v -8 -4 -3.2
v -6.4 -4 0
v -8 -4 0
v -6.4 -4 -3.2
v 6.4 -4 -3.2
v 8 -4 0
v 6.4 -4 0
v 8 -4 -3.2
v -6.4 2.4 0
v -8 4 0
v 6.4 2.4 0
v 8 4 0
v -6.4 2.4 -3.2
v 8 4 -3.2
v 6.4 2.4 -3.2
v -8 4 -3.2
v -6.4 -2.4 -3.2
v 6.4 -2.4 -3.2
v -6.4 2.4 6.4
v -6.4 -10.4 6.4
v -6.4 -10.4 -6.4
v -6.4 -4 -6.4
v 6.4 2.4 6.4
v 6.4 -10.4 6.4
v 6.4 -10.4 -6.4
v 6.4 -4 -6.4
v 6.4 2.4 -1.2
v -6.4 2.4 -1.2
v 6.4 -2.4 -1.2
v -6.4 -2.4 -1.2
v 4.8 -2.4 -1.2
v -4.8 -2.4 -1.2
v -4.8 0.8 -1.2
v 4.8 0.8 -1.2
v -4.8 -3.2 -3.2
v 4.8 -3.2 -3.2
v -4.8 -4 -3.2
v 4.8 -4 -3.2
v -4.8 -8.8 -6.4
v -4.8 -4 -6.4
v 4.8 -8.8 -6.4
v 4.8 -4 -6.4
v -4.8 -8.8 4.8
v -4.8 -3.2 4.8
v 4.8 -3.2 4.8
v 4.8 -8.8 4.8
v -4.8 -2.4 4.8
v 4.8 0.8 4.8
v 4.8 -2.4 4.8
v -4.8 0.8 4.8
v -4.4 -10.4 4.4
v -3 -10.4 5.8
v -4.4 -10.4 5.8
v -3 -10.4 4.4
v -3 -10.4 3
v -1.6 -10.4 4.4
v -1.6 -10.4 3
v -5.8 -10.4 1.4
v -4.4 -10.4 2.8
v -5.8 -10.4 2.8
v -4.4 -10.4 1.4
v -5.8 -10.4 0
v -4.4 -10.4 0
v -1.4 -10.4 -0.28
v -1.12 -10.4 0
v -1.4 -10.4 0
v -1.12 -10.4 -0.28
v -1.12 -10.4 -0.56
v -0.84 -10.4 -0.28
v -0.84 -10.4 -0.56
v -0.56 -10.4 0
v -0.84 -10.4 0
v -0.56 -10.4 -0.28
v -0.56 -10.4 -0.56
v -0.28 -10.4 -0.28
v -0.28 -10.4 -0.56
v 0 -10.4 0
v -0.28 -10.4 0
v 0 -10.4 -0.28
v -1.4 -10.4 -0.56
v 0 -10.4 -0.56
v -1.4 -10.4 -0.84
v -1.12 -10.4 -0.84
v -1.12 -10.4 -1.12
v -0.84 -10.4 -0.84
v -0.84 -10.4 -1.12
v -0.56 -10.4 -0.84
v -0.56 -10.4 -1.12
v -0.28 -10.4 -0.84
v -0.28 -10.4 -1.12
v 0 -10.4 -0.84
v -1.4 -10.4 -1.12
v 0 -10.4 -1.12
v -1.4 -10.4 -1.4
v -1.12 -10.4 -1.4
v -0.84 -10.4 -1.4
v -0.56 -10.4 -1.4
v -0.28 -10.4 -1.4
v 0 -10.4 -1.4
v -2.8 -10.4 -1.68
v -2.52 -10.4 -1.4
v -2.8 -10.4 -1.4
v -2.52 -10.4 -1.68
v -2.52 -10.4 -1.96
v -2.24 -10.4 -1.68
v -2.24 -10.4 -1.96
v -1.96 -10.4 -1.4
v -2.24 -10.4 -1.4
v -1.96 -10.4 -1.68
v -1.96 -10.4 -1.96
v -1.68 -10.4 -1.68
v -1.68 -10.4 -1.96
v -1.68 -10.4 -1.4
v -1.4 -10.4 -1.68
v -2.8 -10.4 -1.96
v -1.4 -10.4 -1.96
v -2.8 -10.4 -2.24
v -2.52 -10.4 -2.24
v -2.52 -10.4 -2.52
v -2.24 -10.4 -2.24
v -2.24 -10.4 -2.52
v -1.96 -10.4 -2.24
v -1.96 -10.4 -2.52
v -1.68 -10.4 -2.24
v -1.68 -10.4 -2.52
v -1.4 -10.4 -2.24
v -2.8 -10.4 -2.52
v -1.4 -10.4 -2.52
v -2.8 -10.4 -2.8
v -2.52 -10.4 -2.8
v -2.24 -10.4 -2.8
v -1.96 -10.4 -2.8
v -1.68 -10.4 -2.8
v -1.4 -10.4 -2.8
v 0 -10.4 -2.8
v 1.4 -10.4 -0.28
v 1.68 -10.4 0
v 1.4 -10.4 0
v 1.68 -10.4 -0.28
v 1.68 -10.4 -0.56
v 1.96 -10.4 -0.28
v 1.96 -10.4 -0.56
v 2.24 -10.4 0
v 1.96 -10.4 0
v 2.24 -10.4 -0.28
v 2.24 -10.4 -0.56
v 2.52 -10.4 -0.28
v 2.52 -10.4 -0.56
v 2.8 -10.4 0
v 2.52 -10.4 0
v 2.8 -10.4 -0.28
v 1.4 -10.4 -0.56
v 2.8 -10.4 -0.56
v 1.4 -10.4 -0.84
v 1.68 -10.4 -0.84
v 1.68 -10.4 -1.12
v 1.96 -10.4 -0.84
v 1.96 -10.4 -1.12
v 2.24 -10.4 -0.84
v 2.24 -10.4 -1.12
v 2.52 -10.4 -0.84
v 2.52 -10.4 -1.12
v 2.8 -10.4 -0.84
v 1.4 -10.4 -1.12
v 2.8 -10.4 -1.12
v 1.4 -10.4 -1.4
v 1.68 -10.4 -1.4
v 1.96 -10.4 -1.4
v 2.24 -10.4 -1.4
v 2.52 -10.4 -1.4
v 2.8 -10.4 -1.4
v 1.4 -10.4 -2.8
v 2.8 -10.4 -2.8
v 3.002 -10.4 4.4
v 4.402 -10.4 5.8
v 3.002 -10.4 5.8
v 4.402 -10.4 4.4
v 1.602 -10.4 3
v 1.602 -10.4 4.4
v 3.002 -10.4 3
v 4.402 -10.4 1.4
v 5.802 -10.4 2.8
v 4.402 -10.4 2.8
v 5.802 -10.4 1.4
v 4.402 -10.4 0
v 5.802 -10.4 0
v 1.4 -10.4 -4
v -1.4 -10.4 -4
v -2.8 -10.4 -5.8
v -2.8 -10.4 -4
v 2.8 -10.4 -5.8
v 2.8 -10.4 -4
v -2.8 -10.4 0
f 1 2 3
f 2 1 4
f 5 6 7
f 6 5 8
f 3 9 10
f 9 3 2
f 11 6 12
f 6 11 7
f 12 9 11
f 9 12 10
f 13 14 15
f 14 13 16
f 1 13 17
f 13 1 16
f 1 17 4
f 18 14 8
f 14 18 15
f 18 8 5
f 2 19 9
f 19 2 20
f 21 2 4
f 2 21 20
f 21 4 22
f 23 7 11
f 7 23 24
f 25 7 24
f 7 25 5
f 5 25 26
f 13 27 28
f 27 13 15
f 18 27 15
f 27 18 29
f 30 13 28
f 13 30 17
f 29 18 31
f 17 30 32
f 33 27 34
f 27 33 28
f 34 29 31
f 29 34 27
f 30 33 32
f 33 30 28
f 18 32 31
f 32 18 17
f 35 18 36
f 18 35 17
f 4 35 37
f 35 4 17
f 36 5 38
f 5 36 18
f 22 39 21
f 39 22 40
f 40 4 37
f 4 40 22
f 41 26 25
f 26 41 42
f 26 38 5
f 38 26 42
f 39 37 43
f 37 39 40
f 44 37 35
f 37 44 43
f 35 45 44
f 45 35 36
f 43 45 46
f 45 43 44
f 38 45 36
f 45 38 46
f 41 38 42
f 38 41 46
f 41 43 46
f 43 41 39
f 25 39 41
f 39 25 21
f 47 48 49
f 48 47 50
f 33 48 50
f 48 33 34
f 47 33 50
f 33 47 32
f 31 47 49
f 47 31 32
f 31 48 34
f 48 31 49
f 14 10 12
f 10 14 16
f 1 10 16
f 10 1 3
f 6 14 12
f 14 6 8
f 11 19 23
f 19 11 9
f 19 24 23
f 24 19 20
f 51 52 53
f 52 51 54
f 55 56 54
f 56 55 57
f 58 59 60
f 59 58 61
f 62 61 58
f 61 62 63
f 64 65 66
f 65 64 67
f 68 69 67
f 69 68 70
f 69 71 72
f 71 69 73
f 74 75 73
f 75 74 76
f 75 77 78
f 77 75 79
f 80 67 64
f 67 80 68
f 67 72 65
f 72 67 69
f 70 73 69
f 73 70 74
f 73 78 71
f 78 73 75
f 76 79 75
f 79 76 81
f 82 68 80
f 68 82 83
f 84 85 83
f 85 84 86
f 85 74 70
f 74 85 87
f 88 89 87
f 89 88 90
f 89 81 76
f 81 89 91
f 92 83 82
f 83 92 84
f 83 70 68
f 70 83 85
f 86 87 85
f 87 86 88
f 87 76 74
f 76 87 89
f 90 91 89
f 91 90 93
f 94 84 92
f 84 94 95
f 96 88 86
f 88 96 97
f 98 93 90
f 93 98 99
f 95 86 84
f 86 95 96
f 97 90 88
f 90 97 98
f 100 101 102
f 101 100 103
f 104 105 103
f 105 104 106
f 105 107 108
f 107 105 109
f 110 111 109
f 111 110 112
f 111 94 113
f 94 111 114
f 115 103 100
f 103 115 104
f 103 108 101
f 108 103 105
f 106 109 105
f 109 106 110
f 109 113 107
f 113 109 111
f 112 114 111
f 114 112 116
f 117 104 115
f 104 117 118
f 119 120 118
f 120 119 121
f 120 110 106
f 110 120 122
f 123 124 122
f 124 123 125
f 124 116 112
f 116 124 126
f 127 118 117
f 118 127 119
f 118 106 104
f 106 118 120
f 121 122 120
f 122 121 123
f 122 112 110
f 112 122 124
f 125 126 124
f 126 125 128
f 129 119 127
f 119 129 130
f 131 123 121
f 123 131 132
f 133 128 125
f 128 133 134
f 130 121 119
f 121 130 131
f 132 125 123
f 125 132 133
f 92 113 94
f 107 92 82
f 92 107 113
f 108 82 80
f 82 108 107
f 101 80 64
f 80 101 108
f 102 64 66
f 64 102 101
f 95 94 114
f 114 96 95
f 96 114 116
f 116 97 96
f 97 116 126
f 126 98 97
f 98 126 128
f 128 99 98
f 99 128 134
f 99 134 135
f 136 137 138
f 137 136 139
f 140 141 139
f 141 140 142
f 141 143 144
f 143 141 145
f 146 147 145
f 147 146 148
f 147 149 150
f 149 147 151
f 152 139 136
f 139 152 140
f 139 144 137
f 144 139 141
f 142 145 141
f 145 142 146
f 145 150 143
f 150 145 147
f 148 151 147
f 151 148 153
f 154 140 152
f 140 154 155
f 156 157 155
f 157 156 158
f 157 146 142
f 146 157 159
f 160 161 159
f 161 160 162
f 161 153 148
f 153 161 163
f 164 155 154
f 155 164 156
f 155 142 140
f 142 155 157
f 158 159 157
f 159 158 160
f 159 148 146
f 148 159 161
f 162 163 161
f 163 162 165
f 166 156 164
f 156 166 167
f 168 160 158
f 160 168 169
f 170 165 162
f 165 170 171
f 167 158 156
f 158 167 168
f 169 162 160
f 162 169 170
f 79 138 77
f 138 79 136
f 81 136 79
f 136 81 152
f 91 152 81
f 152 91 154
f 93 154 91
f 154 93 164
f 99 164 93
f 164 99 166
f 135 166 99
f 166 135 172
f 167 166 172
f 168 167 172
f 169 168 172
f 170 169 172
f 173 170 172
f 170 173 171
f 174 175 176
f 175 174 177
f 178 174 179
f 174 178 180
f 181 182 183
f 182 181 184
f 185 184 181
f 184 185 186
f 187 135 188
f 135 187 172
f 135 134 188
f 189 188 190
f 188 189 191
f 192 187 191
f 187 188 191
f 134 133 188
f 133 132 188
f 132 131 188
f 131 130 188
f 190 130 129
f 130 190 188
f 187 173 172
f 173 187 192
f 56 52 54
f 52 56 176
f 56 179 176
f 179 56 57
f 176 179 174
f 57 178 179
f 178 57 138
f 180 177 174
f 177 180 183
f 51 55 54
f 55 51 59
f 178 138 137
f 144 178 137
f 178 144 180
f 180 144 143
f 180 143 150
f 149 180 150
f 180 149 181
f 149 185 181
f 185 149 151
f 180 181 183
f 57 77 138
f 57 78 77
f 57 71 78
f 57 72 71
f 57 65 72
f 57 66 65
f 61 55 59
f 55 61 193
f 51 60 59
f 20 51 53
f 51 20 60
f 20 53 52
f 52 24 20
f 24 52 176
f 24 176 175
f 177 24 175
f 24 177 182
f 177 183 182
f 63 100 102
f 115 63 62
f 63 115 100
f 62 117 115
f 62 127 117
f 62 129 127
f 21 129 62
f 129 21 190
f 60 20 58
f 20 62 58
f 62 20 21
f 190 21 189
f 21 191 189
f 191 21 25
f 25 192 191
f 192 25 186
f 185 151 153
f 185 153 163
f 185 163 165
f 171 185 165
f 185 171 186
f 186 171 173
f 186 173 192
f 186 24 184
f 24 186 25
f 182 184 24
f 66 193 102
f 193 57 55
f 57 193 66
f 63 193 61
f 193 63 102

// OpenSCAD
// file: ../p/rect3.scad
use <../lib.scad>
function ldraw_lib__rect3() = [
// 0 Rectangle with 3 Edges
// 0 Name: rect3.dat
// 0 Author: Mark Kennedy [mkennedy]
// 0 !LDRAW_ORG Primitive UPDATE 2010-01
// 0 !LICENSE Licensed under CC BY 2.0 and CC BY 4.0 : see CAreadme.txt
// 
// 0 BFC CERTIFY CCW
  [0,"BFC","CERTIFY"],
  [0,"BFC","CCW"],
// 
// 0 !HISTORY 2003-08-01 [PTadmin] Official Update 2003-02
// 0 !HISTORY 2007-06-24 [PTadmin] Header formatted for Contributor Agreement
// 0 !HISTORY 2008-07-01 [PTadmin] Official Update 2008-01
// 0 !HISTORY 2010-01-17 [mikeheide] Change winding to CCW
// 0 !HISTORY 2010-04-05 [PTadmin] Official Update 2010-01
// 
// 
// 2 24 1 0 1 -1 0 1
  [2,24,1,0,1,-1,0,1],
// 2 24 1 0 1 1 0 -1
  [2,24,1,0,1,1,0,-1],
// 2 24 -1 0 1 -1 0 -1
  [2,24,-1,0,1,-1,0,-1],
// 4 16 -1 0 1 -1 0 -1 1 0 -1 1 0 1
  [4,16,-1,0,1,-1,0,-1,1,0,-1,1,0,1],
// 0 //
];
makepoly(ldraw_lib__rect3(), line=0.2);
// file: ../p/rect.scad
use <../lib.scad>
function ldraw_lib__rect() = [
// 0 Rectangle
// 0 Name: rect.dat
// 0 Author: James Jessiman
// 0 !LDRAW_ORG Primitive UPDATE 2010-01
// 0 !LICENSE Licensed under CC BY 2.0 and CC BY 4.0 : see CAreadme.txt
// 
// 0 BFC CERTIFY CCW
  [0,"BFC","CERTIFY"],
  [0,"BFC","CCW"],
// 
// 0 !HISTORY 2002-04-05 [hafhead] Added BFC statement
// 0 !HISTORY 2002-04-25 [PTadmin] Official Update 2002-02
// 0 !HISTORY 2007-06-24 [PTadmin] Header formatted for Contributor Agreement
// 0 !HISTORY 2008-07-01 [PTadmin] Official Update 2008-01
// 0 !HISTORY 2010-01-17 [mikeheide] changed winding to CCW
// 0 !HISTORY 2010-04-05 [PTadmin] Official Update 2010-01
// 
// 
// 2 24 1 0 1 -1 0 1
  [2,24,1,0,1,-1,0,1],
// 2 24 -1 0 1 -1 0 -1
  [2,24,-1,0,1,-1,0,-1],
// 2 24 -1 0 -1 1 0 -1
  [2,24,-1,0,-1,1,0,-1],
// 2 24 1 0 -1 1 0 1
  [2,24,1,0,-1,1,0,1],
// 4 16 -1 0 1 -1 0 -1 1 0 -1 1 0 1
  [4,16,-1,0,1,-1,0,-1,1,0,-1,1,0,1],
// 0
];
makepoly(ldraw_lib__rect(), line=0.2);
// file: ../p/box5-1.scad
use <../lib.scad>
function ldraw_lib__box5_1() = [
// 0 Box with 5 Faces without 1 Edge
// 0 Name: box5-1.dat
// 0 Author: J.C. Tchang [tchang]
// 0 !LDRAW_ORG Primitive UPDATE 2014-01
// 0 !LICENSE Licensed under CC BY 2.0 and CC BY 4.0 : see CAreadme.txt
// 
// 0 BFC CERTIFY CCW
  [0,"BFC","CERTIFY"],
  [0,"BFC","CCW"],
// 
// 0 !HISTORY 2014-06-21 [PTadmin] Official Update 2014-01
// 
// 
// 2 24 1 1 1 -1 1 1
  [2,24,1,1,1,-1,1,1],
// 2 24 -1 1 1 -1 1 -1
  [2,24,-1,1,1,-1,1,-1],
// 2 24 -1 1 -1 1 1 -1
  [2,24,-1,1,-1,1,1,-1],
// 2 24 1 1 -1 1 1 1
  [2,24,1,1,-1,1,1,1],
// 2 24 1 0 1 -1 0 1
  [2,24,1,0,1,-1,0,1],
// 2 24 -1 0 1 -1 0 -1
  [2,24,-1,0,1,-1,0,-1],
// 2 24 1 0 -1 1 0 1
  [2,24,1,0,-1,1,0,1],
// 2 24 1 0 1 1 1 1
  [2,24,1,0,1,1,1,1],
// 2 24 -1 0 1 -1 1 1
  [2,24,-1,0,1,-1,1,1],
// 2 24 1 0 -1 1 1 -1
  [2,24,1,0,-1,1,1,-1],
// 2 24 -1 0 -1 -1 1 -1
  [2,24,-1,0,-1,-1,1,-1],
// 4 16 -1 1 1 1 1 1 1 1 -1 -1 1 -1
  [4,16,-1,1,1,1,1,1,1,1,-1,-1,1,-1],
// 4 16 -1 1 1 -1 0 1 1 0 1 1 1 1
  [4,16,-1,1,1,-1,0,1,1,0,1,1,1,1],
// 4 16 -1 1 -1 -1 0 -1 -1 0 1 -1 1 1
  [4,16,-1,1,-1,-1,0,-1,-1,0,1,-1,1,1],
// 4 16 1 1 -1 1 0 -1 -1 0 -1 -1 1 -1
  [4,16,1,1,-1,1,0,-1,-1,0,-1,-1,1,-1],
// 4 16 1 1 1 1 0 1 1 0 -1 1 1 -1
  [4,16,1,1,1,1,0,1,1,0,-1,1,1,-1],
];
makepoly(ldraw_lib__box5_1(), line=0.2);
// file: ../p/box3u2p.scad
use <../lib.scad>
function ldraw_lib__box3u2p() = [
// 0 Box with 3 Faces without 2 Parallel Edges
// 0 Name: box3u2p.dat
// 0 Author: Niels Karsdorp [nielsk]
// 0 !LDRAW_ORG Primitive UPDATE 2012-01
// 0 !LICENSE Licensed under CC BY 2.0 and CC BY 4.0 : see CAreadme.txt
// 
// 0 BFC CERTIFY CCW
  [0,"BFC","CERTIFY"],
  [0,"BFC","CCW"],
// 
// 0 !HISTORY 2003-03-12 [PTadmin] Official Update 2003-01
// 0 !HISTORY 2007-06-24 [PTadmin] Header formatted for Contributor Agreement
// 0 !HISTORY 2008-07-01 [PTadmin] Official Update 2008-01
// 0 !HISTORY 2012-02-16 [Philo] Changed to CCW
// 0 !HISTORY 2012-03-30 [PTadmin] Official Update 2012-01
// 
// 
// 2 24 1 1 1 -1 1 1
  [2,24,1,1,1,-1,1,1],
// 2 24 -1 1 -1 1 1 -1
  [2,24,-1,1,-1,1,1,-1],
// 2 24 1 0 1 -1 0 1
  [2,24,1,0,1,-1,0,1],
// 2 24 -1 0 -1 1 0 -1
  [2,24,-1,0,-1,1,0,-1],
// 2 24 1 1 1 1 1 -1
  [2,24,1,1,1,1,1,-1],
// 2 24 -1 1 1 -1 1 -1
  [2,24,-1,1,1,-1,1,-1],
// 2 24 1 1 1 1 0 1
  [2,24,1,1,1,1,0,1],
// 2 24 1 1 -1 1 0 -1
  [2,24,1,1,-1,1,0,-1],
// 2 24 -1 1 1 -1 0 1
  [2,24,-1,1,1,-1,0,1],
// 2 24 -1 1 -1 -1 0 -1
  [2,24,-1,1,-1,-1,0,-1],
// 4 16 -1 1 -1 -1 1 1 1 1 1 1 1 -1
  [4,16,-1,1,-1,-1,1,1,1,1,1,1,1,-1],
// 4 16 -1 1 1 -1 0 1 1 0 1 1 1 1
  [4,16,-1,1,1,-1,0,1,1,0,1,1,1,1],
// 4 16 1 1 -1 1 0 -1 -1 0 -1 -1 1 -1
  [4,16,1,1,-1,1,0,-1,-1,0,-1,-1,1,-1],
];
makepoly(ldraw_lib__box3u2p(), line=0.2);
// file: ../p/box2-5.scad
use <../lib.scad>
function ldraw_lib__box2_5() = [
// 0 Box with 2 Faces without 5 Edges
// 0 Name: box2-5.dat
// 0 Author: Steffen [Steffen]
// 0 !LDRAW_ORG Primitive UPDATE 2003-03
// 0 !LICENSE Licensed under CC BY 2.0 and CC BY 4.0 : see CAreadme.txt
// 
// 0 BFC CERTIFY CCW
  [0,"BFC","CERTIFY"],
  [0,"BFC","CCW"],
// 
// 0 !HISTORY 2003-12-19 [PTadmin] Official Update 2003-03
// 0 !HISTORY 2007-06-24 [PTadmin] Header formatted for Contributor Agreement
// 0 !HISTORY 2008-07-01 [PTadmin] Official Update 2008-01
// 
// 
// 2 24 1 1 1 -1 1 1
  [2,24,1,1,1,-1,1,1],
// 2 24 1 1 -1 -1 1 -1
  [2,24,1,1,-1,-1,1,-1],
// 2 24 1 -1 1 -1 -1 1
  [2,24,1,-1,1,-1,-1,1],
// 2 24 -1 -1 1 -1 1 1
  [2,24,-1,-1,1,-1,1,1],
// 2 24 1 -1 1 1 1 1
  [2,24,1,-1,1,1,1,1],
// 2 24 -1 1 -1 -1 1 1
  [2,24,-1,1,-1,-1,1,1],
// 2 24 1 1 -1 1 1 1
  [2,24,1,1,-1,1,1,1],
// 4 16 1 1 1 1 1 -1 -1 1 -1 -1 1 1
  [4,16,1,1,1,1,1,-1,-1,1,-1,-1,1,1],
// 4 16 1 1 1 -1 1 1 -1 -1 1 1 -1 1
  [4,16,1,1,1,-1,1,1,-1,-1,1,1,-1,1],
// 0
];
makepoly(ldraw_lib__box2_5(), line=0.2);
// file: s/19727s01.scad
use <../../lib.scad>
use <../../p/box2-5.scad>
use <../../p/box3u2p.scad>
use <../../p/box5-1.scad>
use <../../p/rect.scad>
use <../../p/rect3.scad>
function ldraw_lib__s__19727s01() = [
// 0 ~Plate  1 x  2 with Cube without Front
// 0 Name: s\19727s01.dat
// 0 Author: Merlijn Wissink [legolijntje]
// 0 !LDRAW_ORG Subpart UPDATE 2016-01
// 0 !LICENSE Licensed under CC BY 2.0 and CC BY 4.0 : see CAreadme.txt
// 
// 0 BFC CERTIFY CCW
  [0,"BFC","CERTIFY"],
  [0,"BFC","CCW"],
// 
// 0 !HISTORY 2016-03-18 {LEGO Digital Designer} Original part shape
// 0 !HISTORY 2016-06-18 [legolijntje] File preparation for LDraw Parts Tracker
// 0 !HISTORY 2016-12-31 [PTadmin] Official Update 2016-01
// 
// 
// 1 16 -18 4 -10 0 0 2 4 0 0 0 1 0 rect3.dat
  [1,16,-18,4,-10,0,0,2,4,0,0,0,1,0, ldraw_lib__rect3()],
// 1 16 18 4 -10 0 0 -2 -4 0 0 0 1 0 rect3.dat
  [1,16,18,4,-10,0,0,-2,-4,0,0,0,1,0, ldraw_lib__rect3()],
// 4 16 -20 0 10 -20 0 -10 -16 0 -10 -16 0 6
  [4,16,-20,0,10,-20,0,-10,-16,0,-10,-16,0,6],
// 4 16 16 0 -10 20 0 -10 20 0 10 16 0 6
  [4,16,16,0,-10,20,0,-10,20,0,10,16,0,6],
// 4 16 -16 0 6 16 0 6 20 0 10 -20 0 10
  [4,16,-16,0,6,16,0,6,20,0,10,-20,0,10],
// 4 16 20 8 10 16 8 6 -16 8 6 -20 8 10
  [4,16,20,8,10,16,8,6,-16,8,6,-20,8,10],
// 4 16 -20 8 -10 -20 8 10 -16 8 6 -16 8 -6
  [4,16,-20,8,-10,-20,8,10,-16,8,6,-16,8,-6],
// 3 16 -20 8 -10 -16 8 -6 -16 8 -10
  [3,16,-20,8,-10,-16,8,-6,-16,8,-10],
// 4 16 16 8 6 20 8 10 20 8 -10 16 8 -6
  [4,16,16,8,6,20,8,10,20,8,-10,16,8,-6],
// 3 16 16 8 -6 20 8 -10 16 8 -10
  [3,16,16,8,-6,20,8,-10,16,8,-10],
// 4 16 -16 -16 -26 -16 -16 6 -16 0 6 -16 0 -10
  [4,16,-16,-16,-26,-16,-16,6,-16,0,6,-16,0,-10],
// 4 16 -16 0 -10 -16 8 -10 -16 16 -26 -16 -16 -26
  [4,16,-16,0,-10,-16,8,-10,-16,16,-26,-16,-16,-26],
// 3 16 -16 16 -26 -16 8 -10 -16 16 -10
  [3,16,-16,16,-26,-16,8,-10,-16,16,-10],
// 4 16 16 0 6 16 -16 6 16 -16 -26 16 0 -10
  [4,16,16,0,6,16,-16,6,16,-16,-26,16,0,-10],
// 4 16 16 16 -26 16 8 -10 16 0 -10 16 -16 -26
  [4,16,16,16,-26,16,8,-10,16,0,-10,16,-16,-26],
// 3 16 16 8 -10 16 16 -26 16 16 -10
  [3,16,16,8,-10,16,16,-26,16,16,-10],
// 1 16 0 5.5 6 16 0 0 0 0 -2.5 0 1 0 rect.dat
  [1,16,0,5.5,6,16,0,0,0,0,-2.5,0,1,0, ldraw_lib__rect()],
// 1 16 16 5.5 0 0 1 0 2.5 0 0 0 0 -6 rect.dat
  [1,16,16,5.5,0,0,1,0,2.5,0,0,0,0,-6, ldraw_lib__rect()],
// 1 16 -16 5.5 0 0 -1 0 0 0 -2.5 6 0 0 rect.dat
  [1,16,-16,5.5,0,0,-1,0,0,0,-2.5,6,0,0, ldraw_lib__rect()],
// 3 16 16 3 -6 16 8 -6 12 3 -6
  [3,16,16,3,-6,16,8,-6,12,3,-6],
// 3 16 -16 8 -6 -16 3 -6 -12 3 -6
  [3,16,-16,8,-6,-16,3,-6,-12,3,-6],
// 4 16 -16 3 6 16 3 6 12 3 2 -12 3 2
  [4,16,-16,3,6,16,3,6,12,3,2,-12,3,2],
// 4 16 16 3 6 16 3 -6 12 3 -6 12 3 2
  [4,16,16,3,6,16,3,-6,12,3,-6,12,3,2],
// 4 16 -12 3 2 -12 3 -6 -16 3 -6 -16 3 6
  [4,16,-12,3,2,-12,3,-6,-16,3,-6,-16,3,6],
// 4 16 12 3 -6 16 8 -6 -16 8 -6 -12 3 -6
  [4,16,12,3,-6,16,8,-6,-16,8,-6,-12,3,-6],
// 4 16 -16 8 -6 16 8 -6 12 8 -8 -12 8 -8
  [4,16,-16,8,-6,16,8,-6,12,8,-8,-12,8,-8],
// 4 16 -16 8 -10 -16 8 -6 -12 8 -8 -12 8 -10
  [4,16,-16,8,-10,-16,8,-6,-12,8,-8,-12,8,-10],
// 4 16 12 8 -8 16 8 -6 16 8 -10 12 8 -10
  [4,16,12,8,-8,16,8,-6,16,8,-10,12,8,-10],
// 4 16 -12 16 -22 -16 16 -26 -16 16 -10 -12 16 -10
  [4,16,-12,16,-22,-16,16,-26,-16,16,-10,-12,16,-10],
// 1 16 -14 12 -10 2 0 0 0 0 4 0 -1 0 rect.dat
  [1,16,-14,12,-10,2,0,0,0,0,4,0,-1,0, ldraw_lib__rect()],
// 4 16 16 16 -10 16 16 -26 12 16 -22 12 16 -10
  [4,16,16,16,-10,16,16,-26,12,16,-22,12,16,-10],
// 1 16 14 12 -10 2 0 0 0 0 4 0 -1 0 rect.dat
  [1,16,14,12,-10,2,0,0,0,0,4,0,-1,0, ldraw_lib__rect()],
// 4 16 -12 16 -22 -12 16 -10 -12 8 -10 -12 -12 -22
  [4,16,-12,16,-22,-12,16,-10,-12,8,-10,-12,-12,-22],
// 4 16 -12 -12 -22 -12 8 -10 -12 8 -8 -12 -12 -8
  [4,16,-12,-12,-22,-12,8,-10,-12,8,-8,-12,-12,-8],
// 1 16 0 -2 -8 0 0 12 10 0 0 0 1 0 rect.dat
  [1,16,0,-2,-8,0,0,12,10,0,0,0,1,0, ldraw_lib__rect()],
// 1 16 0 -12 -15 0 0 12 0 -1 0 7 0 0 rect.dat
  [1,16,0,-12,-15,0,0,12,0,-1,0,7,0,0, ldraw_lib__rect()],
// 4 16 12 -12 -8 12 8 -8 12 8 -10 12 -12 -22
  [4,16,12,-12,-8,12,8,-8,12,8,-10,12,-12,-22],
// 4 16 12 16 -22 12 -12 -22 12 8 -10 12 16 -10
  [4,16,12,16,-22,12,-12,-22,12,8,-10,12,16,-10],
// 1 16 0 2 -22 12 0 0 0 0 14 0 -1 0 rect3.dat
  [1,16,0,2,-22,12,0,0,0,0,14,0,-1,0, ldraw_lib__rect3()],
// 4 16 -16 16 -26 -12 16 -22 12 16 -22 16 16 -26
  [4,16,-16,16,-26,-12,16,-22,12,16,-22,16,16,-26],
// 2 24 -16 -16 -26 -16 16 -26
  [2,24,-16,-16,-26,-16,16,-26],
// 2 24 -16 16 -26 16 16 -26
  [2,24,-16,16,-26,16,16,-26],
// 2 24 16 16 -26 16 -16 -26
  [2,24,16,16,-26,16,-16,-26],
// 2 24 16 16 -26 16 16 -10
  [2,24,16,16,-26,16,16,-10],
// 2 24 -16 16 -10 -16 16 -26
  [2,24,-16,16,-10,-16,16,-26],
// 2 24 -12 16 -10 -12 16 -22
  [2,24,-12,16,-10,-12,16,-22],
// 2 24 12 16 -22 12 16 -10
  [2,24,12,16,-22,12,16,-10],
// 2 24 16 0 -10 16 0 6
  [2,24,16,0,-10,16,0,6],
// 2 24 -16 0 6 -16 0 -10
  [2,24,-16,0,6,-16,0,-10],
// 2 24 -12 8 -8 -12 8 -10
  [2,24,-12,8,-8,-12,8,-10],
// 2 24 12 8 -8 12 8 -10
  [2,24,12,8,-8,12,8,-10],
// 2 24 -16 8 -6 16 8 -6
  [2,24,-16,8,-6,16,8,-6],
// 2 24 -12 3 -6 -16 3 -6
  [2,24,-12,3,-6,-16,3,-6],
// 2 24 12 3 -6 16 3 -6
  [2,24,12,3,-6,16,3,-6],
// 0 BFC INVERTNEXT
  [0,"BFC","INVERTNEXT"],
// 1 16 0 3 -2 12 0 0 0 -15 0 0 0 4 box5-1.dat
  [1,16,0,3,-2,12,0,0,0,-15,0,0,0,4, ldraw_lib__box5_1()],
// 1 16 0 4 -10 0 0 -20 -4 0 0 0 20 0 box3u2p.dat
  [1,16,0,4,-10,0,0,-20,-4,0,0,0,20,0, ldraw_lib__box3u2p()],
// 1 16 0 -8 -10 16 0 0 0 0 -8 0 16 0 box2-5.dat
  [1,16,0,-8,-10,16,0,0,0,0,-8,0,16,0, ldraw_lib__box2_5()],
];
makepoly(ldraw_lib__s__19727s01(), line=0.2);
// main file
use <../lib.scad>
use <s/19727s01.scad>
function ldraw_lib__19727p01() = [
// 0 Plate  1 x  2 with Cube with Minecraft Spider Pattern
// 0 Name: 19727p01.dat
// 0 Author: Merlijn Wissink [legolijntje]
// 0 !LDRAW_ORG Part UPDATE 2019-01
// 0 !LICENSE Licensed under CC BY 2.0 and CC BY 4.0 : see CAreadme.txt
// 
// 0 BFC CERTIFY CCW
  [0,"BFC","CERTIFY"],
  [0,"BFC","CCW"],
// 
// 0 !HISTORY 2019-06-28 [PTadmin] Official Update 2019-01
// 
// 
// 1 16 0 0 0 1 0 0 0 1 0 0 0 1 s\19727s01.dat
  [1,16,0,0,0,1,0,0,0,1,0,0,0,1, ldraw_lib__s__19727s01()],
// 
// 4 4 -7.5 -11 -26 -7.5 -14.5 -26 -11 -14.5 -26 -11 -11 -26
  [4,4,-7.5,-11,-26,-7.5,-14.5,-26,-11,-14.5,-26,-11,-11,-26],
// 4 320 -7.5 -11 -26 -7.5 -7.5 -26 -4 -7.5 -26 -4 -11 -26
  [4,320,-7.5,-11,-26,-7.5,-7.5,-26,-4,-7.5,-26,-4,-11,-26],
// 4 4 -11 -3.5 -26 -11 -7 -26 -14.5 -7 -26 -14.5 -3.5 -26
  [4,4,-11,-3.5,-26,-11,-7,-26,-14.5,-7,-26,-14.5,-3.5,-26],
// 4 320 -11 0 -26 -11 -3.5 -26 -14.5 -3.5 -26 -14.5 0 -26
  [4,320,-11,0,-26,-11,-3.5,-26,-14.5,-3.5,-26,-14.5,0,-26],
// 4 320 -3.5 0 -26 -3.5 0.7 -26 -2.8 0.7 -26 -2.8 0 -26
  [4,320,-3.5,0,-26,-3.5,0.7,-26,-2.8,0.7,-26,-2.8,0,-26],
// 4 320 -2.8 0.7 -26 -2.8 1.4 -26 -2.1 1.4 -26 -2.1 0.7 -26
  [4,320,-2.8,0.7,-26,-2.8,1.4,-26,-2.1,1.4,-26,-2.1,0.7,-26],
// 4 320 -2.1 0 -26 -2.1 0.7 -26 -1.4 0.7 -26 -1.4 0 -26
  [4,320,-2.1,0,-26,-2.1,0.7,-26,-1.4,0.7,-26,-1.4,0,-26],
// 4 320 -1.4 0.7 -26 -1.4 1.4 -26 -0.7 1.4 -26 -0.7 0.7 -26
  [4,320,-1.4,0.7,-26,-1.4,1.4,-26,-0.7,1.4,-26,-0.7,0.7,-26],
// 4 320 -0.7 0 -26 -0.7 0.7 -26 0 0.7 -26 0 0 -26
  [4,320,-0.7,0,-26,-0.7,0.7,-26,0,0.7,-26,0,0,-26],
// 4 4 -3.5 0.7 -26 -3.5 1.4 -26 -2.8 1.4 -26 -2.8 0.7 -26
  [4,4,-3.5,0.7,-26,-3.5,1.4,-26,-2.8,1.4,-26,-2.8,0.7,-26],
// 4 4 -2.8 0 -26 -2.8 0.7 -26 -2.1 0.7 -26 -2.1 0 -26
  [4,4,-2.8,0,-26,-2.8,0.7,-26,-2.1,0.7,-26,-2.1,0,-26],
// 4 4 -2.1 0.7 -26 -2.1 1.4 -26 -1.4 1.4 -26 -1.4 0.7 -26
  [4,4,-2.1,0.7,-26,-2.1,1.4,-26,-1.4,1.4,-26,-1.4,0.7,-26],
// 4 4 -1.4 0 -26 -1.4 0.7 -26 -0.7 0.7 -26 -0.7 0 -26
  [4,4,-1.4,0,-26,-1.4,0.7,-26,-0.7,0.7,-26,-0.7,0,-26],
// 4 4 -0.7 0.7 -26 -0.7 1.4 -26 0 1.4 -26 0 0.7 -26
  [4,4,-0.7,0.7,-26,-0.7,1.4,-26,0,1.4,-26,0,0.7,-26],
// 4 320 -3.5 1.4 -26 -3.5 2.1 -26 -2.8 2.1 -26 -2.8 1.4 -26
  [4,320,-3.5,1.4,-26,-3.5,2.1,-26,-2.8,2.1,-26,-2.8,1.4,-26],
// 4 320 -2.8 2.1 -26 -2.8 2.8 -26 -2.1 2.8 -26 -2.1 2.1 -26
  [4,320,-2.8,2.1,-26,-2.8,2.8,-26,-2.1,2.8,-26,-2.1,2.1,-26],
// 4 320 -2.1 1.4 -26 -2.1 2.1 -26 -1.4 2.1 -26 -1.4 1.4 -26
  [4,320,-2.1,1.4,-26,-2.1,2.1,-26,-1.4,2.1,-26,-1.4,1.4,-26],
// 4 320 -1.4 2.1 -26 -1.4 2.8 -26 -0.7 2.8 -26 -0.7 2.1 -26
  [4,320,-1.4,2.1,-26,-1.4,2.8,-26,-0.7,2.8,-26,-0.7,2.1,-26],
// 4 320 -0.7 1.4 -26 -0.7 2.1 -26 0 2.1 -26 0 1.4 -26
  [4,320,-0.7,1.4,-26,-0.7,2.1,-26,0,2.1,-26,0,1.4,-26],
// 4 4 -3.5 2.1 -26 -3.5 2.8 -26 -2.8 2.8 -26 -2.8 2.1 -26
  [4,4,-3.5,2.1,-26,-3.5,2.8,-26,-2.8,2.8,-26,-2.8,2.1,-26],
// 4 4 -2.8 1.4 -26 -2.8 2.1 -26 -2.1 2.1 -26 -2.1 1.4 -26
  [4,4,-2.8,1.4,-26,-2.8,2.1,-26,-2.1,2.1,-26,-2.1,1.4,-26],
// 4 4 -2.1 2.1 -26 -2.1 2.8 -26 -1.4 2.8 -26 -1.4 2.1 -26
  [4,4,-2.1,2.1,-26,-2.1,2.8,-26,-1.4,2.8,-26,-1.4,2.1,-26],
// 4 4 -1.4 1.4 -26 -1.4 2.1 -26 -0.7 2.1 -26 -0.7 1.4 -26
  [4,4,-1.4,1.4,-26,-1.4,2.1,-26,-0.7,2.1,-26,-0.7,1.4,-26],
// 4 4 -0.7 2.1 -26 -0.7 2.8 -26 0 2.8 -26 0 2.1 -26
  [4,4,-0.7,2.1,-26,-0.7,2.8,-26,0,2.8,-26,0,2.1,-26],
// 4 320 -3.5 2.8 -26 -3.5 3.5 -26 -2.8 3.5 -26 -2.8 2.8 -26
  [4,320,-3.5,2.8,-26,-3.5,3.5,-26,-2.8,3.5,-26,-2.8,2.8,-26],
// 4 320 -2.1 2.8 -26 -2.1 3.5 -26 -1.4 3.5 -26 -1.4 2.8 -26
  [4,320,-2.1,2.8,-26,-2.1,3.5,-26,-1.4,3.5,-26,-1.4,2.8,-26],
// 4 320 -0.7 2.8 -26 -0.7 3.5 -26 0 3.5 -26 0 2.8 -26
  [4,320,-0.7,2.8,-26,-0.7,3.5,-26,0,3.5,-26,0,2.8,-26],
// 4 4 -2.8 2.8 -26 -2.8 3.5 -26 -2.1 3.5 -26 -2.1 2.8 -26
  [4,4,-2.8,2.8,-26,-2.8,3.5,-26,-2.1,3.5,-26,-2.1,2.8,-26],
// 4 4 -1.4 2.8 -26 -1.4 3.5 -26 -0.7 3.5 -26 -0.7 2.8 -26
  [4,4,-1.4,2.8,-26,-1.4,3.5,-26,-0.7,3.5,-26,-0.7,2.8,-26],
// 4 320 -7 3.5 -26 -7 4.2 -26 -6.3 4.2 -26 -6.3 3.5 -26
  [4,320,-7,3.5,-26,-7,4.2,-26,-6.3,4.2,-26,-6.3,3.5,-26],
// 4 320 -6.3 4.2 -26 -6.3 4.9 -26 -5.6 4.9 -26 -5.6 4.2 -26
  [4,320,-6.3,4.2,-26,-6.3,4.9,-26,-5.6,4.9,-26,-5.6,4.2,-26],
// 4 320 -5.6 3.5 -26 -5.6 4.2 -26 -4.9 4.2 -26 -4.9 3.5 -26
  [4,320,-5.6,3.5,-26,-5.6,4.2,-26,-4.9,4.2,-26,-4.9,3.5,-26],
// 4 320 -4.9 4.2 -26 -4.9 4.9 -26 -4.2 4.9 -26 -4.2 4.2 -26
  [4,320,-4.9,4.2,-26,-4.9,4.9,-26,-4.2,4.9,-26,-4.2,4.2,-26],
// 4 320 -4.2 3.5 -26 -4.2 4.2 -26 -3.5 4.2 -26 -3.5 3.5 -26
  [4,320,-4.2,3.5,-26,-4.2,4.2,-26,-3.5,4.2,-26,-3.5,3.5,-26],
// 4 4 -7 4.2 -26 -7 4.9 -26 -6.3 4.9 -26 -6.3 4.2 -26
  [4,4,-7,4.2,-26,-7,4.9,-26,-6.3,4.9,-26,-6.3,4.2,-26],
// 4 4 -6.3 3.5 -26 -6.3 4.2 -26 -5.6 4.2 -26 -5.6 3.5 -26
  [4,4,-6.3,3.5,-26,-6.3,4.2,-26,-5.6,4.2,-26,-5.6,3.5,-26],
// 4 4 -5.6 4.2 -26 -5.6 4.9 -26 -4.9 4.9 -26 -4.9 4.2 -26
  [4,4,-5.6,4.2,-26,-5.6,4.9,-26,-4.9,4.9,-26,-4.9,4.2,-26],
// 4 4 -4.9 3.5 -26 -4.9 4.2 -26 -4.2 4.2 -26 -4.2 3.5 -26
  [4,4,-4.9,3.5,-26,-4.9,4.2,-26,-4.2,4.2,-26,-4.2,3.5,-26],
// 4 4 -4.2 4.2 -26 -4.2 4.9 -26 -3.5 4.9 -26 -3.5 4.2 -26
  [4,4,-4.2,4.2,-26,-4.2,4.9,-26,-3.5,4.9,-26,-3.5,4.2,-26],
// 4 320 -7 4.9 -26 -7 5.6 -26 -6.3 5.6 -26 -6.3 4.9 -26
  [4,320,-7,4.9,-26,-7,5.6,-26,-6.3,5.6,-26,-6.3,4.9,-26],
// 4 320 -6.3 5.6 -26 -6.3 6.3 -26 -5.6 6.3 -26 -5.6 5.6 -26
  [4,320,-6.3,5.6,-26,-6.3,6.3,-26,-5.6,6.3,-26,-5.6,5.6,-26],
// 4 320 -5.6 4.9 -26 -5.6 5.6 -26 -4.9 5.6 -26 -4.9 4.9 -26
  [4,320,-5.6,4.9,-26,-5.6,5.6,-26,-4.9,5.6,-26,-4.9,4.9,-26],
// 4 320 -4.9 5.6 -26 -4.9 6.3 -26 -4.2 6.3 -26 -4.2 5.6 -26
  [4,320,-4.9,5.6,-26,-4.9,6.3,-26,-4.2,6.3,-26,-4.2,5.6,-26],
// 4 320 -4.2 4.9 -26 -4.2 5.6 -26 -3.5 5.6 -26 -3.5 4.9 -26
  [4,320,-4.2,4.9,-26,-4.2,5.6,-26,-3.5,5.6,-26,-3.5,4.9,-26],
// 4 4 -7 5.6 -26 -7 6.3 -26 -6.3 6.3 -26 -6.3 5.6 -26
  [4,4,-7,5.6,-26,-7,6.3,-26,-6.3,6.3,-26,-6.3,5.6,-26],
// 4 4 -6.3 4.9 -26 -6.3 5.6 -26 -5.6 5.6 -26 -5.6 4.9 -26
  [4,4,-6.3,4.9,-26,-6.3,5.6,-26,-5.6,5.6,-26,-5.6,4.9,-26],
// 4 4 -5.6 5.6 -26 -5.6 6.3 -26 -4.9 6.3 -26 -4.9 5.6 -26
  [4,4,-5.6,5.6,-26,-5.6,6.3,-26,-4.9,6.3,-26,-4.9,5.6,-26],
// 4 4 -4.9 4.9 -26 -4.9 5.6 -26 -4.2 5.6 -26 -4.2 4.9 -26
  [4,4,-4.9,4.9,-26,-4.9,5.6,-26,-4.2,5.6,-26,-4.2,4.9,-26],
// 4 4 -4.2 5.6 -26 -4.2 6.3 -26 -3.5 6.3 -26 -3.5 5.6 -26
  [4,4,-4.2,5.6,-26,-4.2,6.3,-26,-3.5,6.3,-26,-3.5,5.6,-26],
// 4 320 -7 6.3 -26 -7 7 -26 -6.3 7 -26 -6.3 6.3 -26
  [4,320,-7,6.3,-26,-7,7,-26,-6.3,7,-26,-6.3,6.3,-26],
// 4 320 -5.6 6.3 -26 -5.6 7 -26 -4.9 7 -26 -4.9 6.3 -26
  [4,320,-5.6,6.3,-26,-5.6,7,-26,-4.9,7,-26,-4.9,6.3,-26],
// 4 320 -4.2 6.3 -26 -4.2 7 -26 -3.5 7 -26 -3.5 6.3 -26
  [4,320,-4.2,6.3,-26,-4.2,7,-26,-3.5,7,-26,-3.5,6.3,-26],
// 4 4 -6.3 6.3 -26 -6.3 7 -26 -5.6 7 -26 -5.6 6.3 -26
  [4,4,-6.3,6.3,-26,-6.3,7,-26,-5.6,7,-26,-5.6,6.3,-26],
// 4 4 -4.9 6.3 -26 -4.9 7 -26 -4.2 7 -26 -4.2 6.3 -26
  [4,4,-4.9,6.3,-26,-4.9,7,-26,-4.2,7,-26,-4.2,6.3,-26],
// 3 4 -3.5 2.8 -26 -4.2 3.5 -26 -3.5 3.5 -26
  [3,4,-3.5,2.8,-26,-4.2,3.5,-26,-3.5,3.5,-26],
// 4 4 -4.2 3.5 -26 -3.5 2.8 -26 -3.5 2.1 -26 -4.9 3.5 -26
  [4,4,-4.2,3.5,-26,-3.5,2.8,-26,-3.5,2.1,-26,-4.9,3.5,-26],
// 4 4 -4.9 3.5 -26 -3.5 2.1 -26 -3.5 1.4 -26 -5.6 3.5 -26
  [4,4,-4.9,3.5,-26,-3.5,2.1,-26,-3.5,1.4,-26,-5.6,3.5,-26],
// 4 4 -5.6 3.5 -26 -3.5 1.4 -26 -3.5 0.7 -26 -6.3 3.5 -26
  [4,4,-5.6,3.5,-26,-3.5,1.4,-26,-3.5,0.7,-26,-6.3,3.5,-26],
// 4 4 -6.3 3.5 -26 -3.5 0.7 -26 -3.5 0 -26 -7 3.5 -26
  [4,4,-6.3,3.5,-26,-3.5,0.7,-26,-3.5,0,-26,-7,3.5,-26],
// 3 320 -2.8 3.5 -26 -3.5 3.5 -26 -3.5 4.2 -26
  [3,320,-2.8,3.5,-26,-3.5,3.5,-26,-3.5,4.2,-26],
// 4 320 -2.8 3.5 -26 -3.5 4.2 -26 -3.5 4.9 -26 -2.1 3.5 -26
  [4,320,-2.8,3.5,-26,-3.5,4.2,-26,-3.5,4.9,-26,-2.1,3.5,-26],
// 4 320 -2.1 3.5 -26 -3.5 4.9 -26 -3.5 5.6 -26 -1.4 3.5 -26
  [4,320,-2.1,3.5,-26,-3.5,4.9,-26,-3.5,5.6,-26,-1.4,3.5,-26],
// 4 320 -1.4 3.5 -26 -3.5 5.6 -26 -3.5 6.3 -26 -0.7 3.5 -26
  [4,320,-1.4,3.5,-26,-3.5,5.6,-26,-3.5,6.3,-26,-0.7,3.5,-26],
// 4 320 -0.7 3.5 -26 -3.5 6.3 -26 -3.5 7 -26 0 3.5 -26
  [4,320,-0.7,3.5,-26,-3.5,6.3,-26,-3.5,7,-26,0,3.5,-26],
// 3 320 0 3.5 -26 -3.5 7 -26 0 7 -26
  [3,320,0,3.5,-26,-3.5,7,-26,0,7,-26],
// 4 320 3.5 0 -26 3.5 0.7 -26 4.2 0.7 -26 4.2 0 -26
  [4,320,3.5,0,-26,3.5,0.7,-26,4.2,0.7,-26,4.2,0,-26],
// 4 320 4.2 0.7 -26 4.2 1.4 -26 4.9 1.4 -26 4.9 0.7 -26
  [4,320,4.2,0.7,-26,4.2,1.4,-26,4.9,1.4,-26,4.9,0.7,-26],
// 4 320 4.9 0 -26 4.9 0.7 -26 5.6 0.7 -26 5.6 0 -26
  [4,320,4.9,0,-26,4.9,0.7,-26,5.6,0.7,-26,5.6,0,-26],
// 4 320 5.6 0.7 -26 5.6 1.4 -26 6.3 1.4 -26 6.3 0.7 -26
  [4,320,5.6,0.7,-26,5.6,1.4,-26,6.3,1.4,-26,6.3,0.7,-26],
// 4 320 6.3 0 -26 6.3 0.7 -26 7 0.7 -26 7 0 -26
  [4,320,6.3,0,-26,6.3,0.7,-26,7,0.7,-26,7,0,-26],
// 4 4 3.5 0.7 -26 3.5 1.4 -26 4.2 1.4 -26 4.2 0.7 -26
  [4,4,3.5,0.7,-26,3.5,1.4,-26,4.2,1.4,-26,4.2,0.7,-26],
// 4 4 4.2 0 -26 4.2 0.7 -26 4.9 0.7 -26 4.9 0 -26
  [4,4,4.2,0,-26,4.2,0.7,-26,4.9,0.7,-26,4.9,0,-26],
// 4 4 4.9 0.7 -26 4.9 1.4 -26 5.6 1.4 -26 5.6 0.7 -26
  [4,4,4.9,0.7,-26,4.9,1.4,-26,5.6,1.4,-26,5.6,0.7,-26],
// 4 4 5.6 0 -26 5.6 0.7 -26 6.3 0.7 -26 6.3 0 -26
  [4,4,5.6,0,-26,5.6,0.7,-26,6.3,0.7,-26,6.3,0,-26],
// 4 4 6.3 0.7 -26 6.3 1.4 -26 7 1.4 -26 7 0.7 -26
  [4,4,6.3,0.7,-26,6.3,1.4,-26,7,1.4,-26,7,0.7,-26],
// 4 320 3.5 1.4 -26 3.5 2.1 -26 4.2 2.1 -26 4.2 1.4 -26
  [4,320,3.5,1.4,-26,3.5,2.1,-26,4.2,2.1,-26,4.2,1.4,-26],
// 4 320 4.2 2.1 -26 4.2 2.8 -26 4.9 2.8 -26 4.9 2.1 -26
  [4,320,4.2,2.1,-26,4.2,2.8,-26,4.9,2.8,-26,4.9,2.1,-26],
// 4 320 4.9 1.4 -26 4.9 2.1 -26 5.6 2.1 -26 5.6 1.4 -26
  [4,320,4.9,1.4,-26,4.9,2.1,-26,5.6,2.1,-26,5.6,1.4,-26],
// 4 320 5.6 2.1 -26 5.6 2.8 -26 6.3 2.8 -26 6.3 2.1 -26
  [4,320,5.6,2.1,-26,5.6,2.8,-26,6.3,2.8,-26,6.3,2.1,-26],
// 4 320 6.3 1.4 -26 6.3 2.1 -26 7 2.1 -26 7 1.4 -26
  [4,320,6.3,1.4,-26,6.3,2.1,-26,7,2.1,-26,7,1.4,-26],
// 4 4 3.5 2.1 -26 3.5 2.8 -26 4.2 2.8 -26 4.2 2.1 -26
  [4,4,3.5,2.1,-26,3.5,2.8,-26,4.2,2.8,-26,4.2,2.1,-26],
// 4 4 4.2 1.4 -26 4.2 2.1 -26 4.9 2.1 -26 4.9 1.4 -26
  [4,4,4.2,1.4,-26,4.2,2.1,-26,4.9,2.1,-26,4.9,1.4,-26],
// 4 4 4.9 2.1 -26 4.9 2.8 -26 5.6 2.8 -26 5.6 2.1 -26
  [4,4,4.9,2.1,-26,4.9,2.8,-26,5.6,2.8,-26,5.6,2.1,-26],
// 4 4 5.6 1.4 -26 5.6 2.1 -26 6.3 2.1 -26 6.3 1.4 -26
  [4,4,5.6,1.4,-26,5.6,2.1,-26,6.3,2.1,-26,6.3,1.4,-26],
// 4 4 6.3 2.1 -26 6.3 2.8 -26 7 2.8 -26 7 2.1 -26
  [4,4,6.3,2.1,-26,6.3,2.8,-26,7,2.8,-26,7,2.1,-26],
// 4 320 3.5 2.8 -26 3.5 3.5 -26 4.2 3.5 -26 4.2 2.8 -26
  [4,320,3.5,2.8,-26,3.5,3.5,-26,4.2,3.5,-26,4.2,2.8,-26],
// 4 320 4.9 2.8 -26 4.9 3.5 -26 5.6 3.5 -26 5.6 2.8 -26
  [4,320,4.9,2.8,-26,4.9,3.5,-26,5.6,3.5,-26,5.6,2.8,-26],
// 4 320 6.3 2.8 -26 6.3 3.5 -26 7 3.5 -26 7 2.8 -26
  [4,320,6.3,2.8,-26,6.3,3.5,-26,7,3.5,-26,7,2.8,-26],
// 4 4 4.2 2.8 -26 4.2 3.5 -26 4.9 3.5 -26 4.9 2.8 -26
  [4,4,4.2,2.8,-26,4.2,3.5,-26,4.9,3.5,-26,4.9,2.8,-26],
// 4 4 5.6 2.8 -26 5.6 3.5 -26 6.3 3.5 -26 6.3 2.8 -26
  [4,4,5.6,2.8,-26,5.6,3.5,-26,6.3,3.5,-26,6.3,2.8,-26],
// 4 4 3.5 0.7 -26 3.5 0 -26 0 0 -26 0 0.7 -26
  [4,4,3.5,0.7,-26,3.5,0,-26,0,0,-26,0,0.7,-26],
// 4 4 3.5 1.4 -26 3.5 0.7 -26 0 0.7 -26 0 1.4 -26
  [4,4,3.5,1.4,-26,3.5,0.7,-26,0,0.7,-26,0,1.4,-26],
// 4 4 3.5 2.1 -26 3.5 1.4 -26 0 1.4 -26 0 2.1 -26
  [4,4,3.5,2.1,-26,3.5,1.4,-26,0,1.4,-26,0,2.1,-26],
// 4 4 3.5 2.8 -26 3.5 2.1 -26 0 2.1 -26 0 2.8 -26
  [4,4,3.5,2.8,-26,3.5,2.1,-26,0,2.1,-26,0,2.8,-26],
// 4 4 3.5 3.5 -26 3.5 2.8 -26 0 2.8 -26 0 3.5 -26
  [4,4,3.5,3.5,-26,3.5,2.8,-26,0,2.8,-26,0,3.5,-26],
// 4 4 3.5 3.5 -26 0 3.5 -26 0 7 -26 3.5 7 -26
  [4,4,3.5,3.5,-26,0,3.5,-26,0,7,-26,3.5,7,-26],
// 3 320 4.2 3.5 -26 3.5 3.5 -26 3.5 7 -26
  [3,320,4.2,3.5,-26,3.5,3.5,-26,3.5,7,-26],
// 3 320 4.9 3.5 -26 4.2 3.5 -26 3.5 7 -26
  [3,320,4.9,3.5,-26,4.2,3.5,-26,3.5,7,-26],
// 3 320 5.6 3.5 -26 4.9 3.5 -26 3.5 7 -26
  [3,320,5.6,3.5,-26,4.9,3.5,-26,3.5,7,-26],
// 3 320 6.3 3.5 -26 5.6 3.5 -26 3.5 7 -26
  [3,320,6.3,3.5,-26,5.6,3.5,-26,3.5,7,-26],
// 4 320 7 3.5 -26 6.3 3.5 -26 3.5 7 -26 7 7 -26
  [4,320,7,3.5,-26,6.3,3.5,-26,3.5,7,-26,7,7,-26],
// 4 320 11.00385 -14.5 -26 7.50385 -14.5 -26 7.50385 -11 -26 11.00385 -11 -26
  [4,320,11.00385,-14.5,-26,7.50385,-14.5,-26,7.50385,-11,-26,11.00385,-11,-26],
// 4 4 4.00385 -7.5 -26 7.50385 -7.5 -26 7.50385 -11 -26 4.00385 -11 -26
  [4,4,4.00385,-7.5,-26,7.50385,-7.5,-26,7.50385,-11,-26,4.00385,-11,-26],
// 4 4 14.50385 -7 -26 11.00385 -7 -26 11.00385 -3.5 -26 14.50385 -3.5 -26
  [4,4,14.50385,-7,-26,11.00385,-7,-26,11.00385,-3.5,-26,14.50385,-3.5,-26],
// 4 320 14.50385 -3.5 -26 11.00385 -3.5 -26 11.00385 0 -26 14.50385 0 -26
  [4,320,14.50385,-3.5,-26,11.00385,-3.5,-26,11.00385,0,-26,14.50385,0,-26],
// 4 0 0 7 -26 -3.5 10 -26 3.5 10 -26 3.5 7 -26
  [4,0,0,7,-26,-3.5,10,-26,3.5,10,-26,3.5,7,-26],
// 3 0 0 7 -26 -3.5 7 -26 -3.5 10 -26
  [3,0,0,7,-26,-3.5,7,-26,-3.5,10,-26],
// 4 0 -3.5 10 -26 -7 10 -26 -7 14.5 -26 7 14.5 -26
  [4,0,-3.5,10,-26,-7,10,-26,-7,14.5,-26,7,14.5,-26],
// 3 0 7 10 -26 3.5 10 -26 7 14.5 -26
  [3,0,7,10,-26,3.5,10,-26,7,14.5,-26],
// 3 0 3.5 10 -26 -3.5 10 -26 7 14.5 -26
  [3,0,3.5,10,-26,-3.5,10,-26,7,14.5,-26],
// 3 16 -3.5 7 -26 -4.2 7 -26 -3.5 10 -26
  [3,16,-3.5,7,-26,-4.2,7,-26,-3.5,10,-26],
// 3 16 -4.2 7 -26 -4.9 7 -26 -3.5 10 -26
  [3,16,-4.2,7,-26,-4.9,7,-26,-3.5,10,-26],
// 3 16 -4.9 7 -26 -5.6 7 -26 -3.5 10 -26
  [3,16,-4.9,7,-26,-5.6,7,-26,-3.5,10,-26],
// 3 16 -5.6 7 -26 -6.3 7 -26 -3.5 10 -26
  [3,16,-5.6,7,-26,-6.3,7,-26,-3.5,10,-26],
// 4 16 -3.5 10 -26 -6.3 7 -26 -7 7 -26 -7 10 -26
  [4,16,-3.5,10,-26,-6.3,7,-26,-7,7,-26,-7,10,-26],
// 4 16 7 7 -26 3.5 7 -26 3.5 10 -26 7 10 -26
  [4,16,7,7,-26,3.5,7,-26,3.5,10,-26,7,10,-26],
// 4 16 -7.5 -14.5 -26 -7.5 -11 -26 -4 -11 -26 7.50385 -14.5 -26
  [4,16,-7.5,-14.5,-26,-7.5,-11,-26,-4,-11,-26,7.50385,-14.5,-26],
// 4 16 4.00385 -11 -26 7.50385 -14.5 -26 -4 -11 -26 -4 -7.5 -26
  [4,16,4.00385,-11,-26,7.50385,-14.5,-26,-4,-11,-26,-4,-7.5,-26],
// 3 16 7.50385 -14.5 -26 4.00385 -11 -26 7.50385 -11 -26
  [3,16,7.50385,-14.5,-26,4.00385,-11,-26,7.50385,-11,-26],
// 4 16 4.00385 -7.5 -26 4.00385 -11 -26 -4 -7.5 -26 3.5 0 -26
  [4,16,4.00385,-7.5,-26,4.00385,-11,-26,-4,-7.5,-26,3.5,0,-26],
// 4 16 11.00385 -11 -26 7.50385 -11 -26 7.50385 -7.5 -26 11.00385 -7 -26
  [4,16,11.00385,-11,-26,7.50385,-11,-26,7.50385,-7.5,-26,11.00385,-7,-26],
// 4 16 -7.5 -7.5 -26 -7.5 -11 -26 -11 -11 -26 -11 -7 -26
  [4,16,-7.5,-7.5,-26,-7.5,-11,-26,-11,-11,-26,-11,-7,-26],
// 3 16 4.00385 -7.5 -26 3.5 0 -26 4.2 0 -26
  [3,16,4.00385,-7.5,-26,3.5,0,-26,4.2,0,-26],
// 4 16 4.00385 -7.5 -26 4.2 0 -26 4.9 0 -26 7.50385 -7.5 -26
  [4,16,4.00385,-7.5,-26,4.2,0,-26,4.9,0,-26,7.50385,-7.5,-26],
// 3 16 7.50385 -7.5 -26 4.9 0 -26 5.6 0 -26
  [3,16,7.50385,-7.5,-26,4.9,0,-26,5.6,0,-26],
// 3 16 7.50385 -7.5 -26 5.6 0 -26 6.3 0 -26
  [3,16,7.50385,-7.5,-26,5.6,0,-26,6.3,0,-26],
// 4 16 7.50385 -7.5 -26 6.3 0 -26 7 0 -26 11.00385 -3.5 -26
  [4,16,7.50385,-7.5,-26,6.3,0,-26,7,0,-26,11.00385,-3.5,-26],
// 4 16 11.00385 0 -26 11.00385 -3.5 -26 7 0 -26 7 0.7 -26
  [4,16,11.00385,0,-26,11.00385,-3.5,-26,7,0,-26,7,0.7,-26],
// 3 16 7.50385 -7.5 -26 11.00385 -3.5 -26 11.00385 -7 -26
  [3,16,7.50385,-7.5,-26,11.00385,-3.5,-26,11.00385,-7,-26],
// 3 16 -4 -7.5 -26 0 0 -26 3.5 0 -26
  [3,16,-4,-7.5,-26,0,0,-26,3.5,0,-26],
// 3 16 -4 -7.5 -26 -0.7 0 -26 0 0 -26
  [3,16,-4,-7.5,-26,-0.7,0,-26,0,0,-26],
// 3 16 -4 -7.5 -26 -1.4 0 -26 -0.7 0 -26
  [3,16,-4,-7.5,-26,-1.4,0,-26,-0.7,0,-26],
// 3 16 -4 -7.5 -26 -2.1 0 -26 -1.4 0 -26
  [3,16,-4,-7.5,-26,-2.1,0,-26,-1.4,0,-26],
// 3 16 -4 -7.5 -26 -2.8 0 -26 -2.1 0 -26
  [3,16,-4,-7.5,-26,-2.8,0,-26,-2.1,0,-26],
// 3 16 -4 -7.5 -26 -3.5 0 -26 -2.8 0 -26
  [3,16,-4,-7.5,-26,-3.5,0,-26,-2.8,0,-26],
// 4 16 -7.5 -7.5 -26 -11 -7 -26 -11 -3.5 -26 -7 0 -26
  [4,16,-7.5,-7.5,-26,-11,-7,-26,-11,-3.5,-26,-7,0,-26],
// 3 16 -11 -11 -26 -14.5 -7 -26 -11 -7 -26
  [3,16,-11,-11,-26,-14.5,-7,-26,-11,-7,-26],
// 4 16 -14.5 -7 -26 -11 -11 -26 -11 -14.5 -26 -16 -16 -26
  [4,16,-14.5,-7,-26,-11,-11,-26,-11,-14.5,-26,-16,-16,-26],
// 3 16 -16 -16 -26 -11 -14.5 -26 -7.5 -14.5 -26
  [3,16,-16,-16,-26,-11,-14.5,-26,-7.5,-14.5,-26],
// 4 16 -16 -16 -26 -7.5 -14.5 -26 7.50385 -14.5 -26 16 -16 -26
  [4,16,-16,-16,-26,-7.5,-14.5,-26,7.50385,-14.5,-26,16,-16,-26],
// 3 16 16 -16 -26 7.50385 -14.5 -26 11.00385 -14.5 -26
  [3,16,16,-16,-26,7.50385,-14.5,-26,11.00385,-14.5,-26],
// 4 16 14.50385 -7 -26 16 -16 -26 11.00385 -14.5 -26 11.00385 -11 -26
  [4,16,14.50385,-7,-26,16,-16,-26,11.00385,-14.5,-26,11.00385,-11,-26],
// 3 16 11.00385 -11 -26 11.00385 -7 -26 14.50385 -7 -26
  [3,16,11.00385,-11,-26,11.00385,-7,-26,14.50385,-7,-26],
// 3 16 -11 0 -26 -7 4.2 -26 -7 3.5 -26
  [3,16,-11,0,-26,-7,4.2,-26,-7,3.5,-26],
// 4 16 -7 4.9 -26 -7 4.2 -26 -11 0 -26 -14.5 0 -26
  [4,16,-7,4.9,-26,-7,4.2,-26,-11,0,-26,-14.5,0,-26],
// 3 16 -14.5 0 -26 -7 5.6 -26 -7 4.9 -26
  [3,16,-14.5,0,-26,-7,5.6,-26,-7,4.9,-26],
// 3 16 -14.5 0 -26 -7 6.3 -26 -7 5.6 -26
  [3,16,-14.5,0,-26,-7,6.3,-26,-7,5.6,-26],
// 3 16 -14.5 0 -26 -7 7 -26 -7 6.3 -26
  [3,16,-14.5,0,-26,-7,7,-26,-7,6.3,-26],
// 4 16 -7 10 -26 -7 7 -26 -14.5 0 -26 -16 16 -26
  [4,16,-7,10,-26,-7,7,-26,-14.5,0,-26,-16,16,-26],
// 3 16 -14.5 -7 -26 -16 -16 -26 -14.5 -3.5 -26
  [3,16,-14.5,-7,-26,-16,-16,-26,-14.5,-3.5,-26],
// 4 16 -14.5 0 -26 -14.5 -3.5 -26 -16 -16 -26 -16 16 -26
  [4,16,-14.5,0,-26,-14.5,-3.5,-26,-16,-16,-26,-16,16,-26],
// 3 16 -7 10 -26 -16 16 -26 -7 14.5 -26
  [3,16,-7,10,-26,-16,16,-26,-7,14.5,-26],
// 4 16 -7 14.5 -26 -16 16 -26 16 16 -26 7 14.5 -26
  [4,16,-7,14.5,-26,-16,16,-26,16,16,-26,7,14.5,-26],
// 4 16 7 10 -26 7 14.5 -26 16 16 -26 14.50385 0 -26
  [4,16,7,10,-26,7,14.5,-26,16,16,-26,14.50385,0,-26],
// 3 16 11.00385 0 -26 7 0.7 -26 7 1.4 -26
  [3,16,11.00385,0,-26,7,0.7,-26,7,1.4,-26],
// 3 16 11.00385 0 -26 7 1.4 -26 7 2.1 -26
  [3,16,11.00385,0,-26,7,1.4,-26,7,2.1,-26],
// 3 16 11.00385 0 -26 7 2.1 -26 7 2.8 -26
  [3,16,11.00385,0,-26,7,2.1,-26,7,2.8,-26],
// 4 16 11.00385 0 -26 7 2.8 -26 7 3.5 -26 14.50385 0 -26
  [4,16,11.00385,0,-26,7,2.8,-26,7,3.5,-26,14.50385,0,-26],
// 3 16 14.50385 0 -26 7 3.5 -26 7 7 -26
  [3,16,14.50385,0,-26,7,3.5,-26,7,7,-26],
// 3 16 14.50385 0 -26 7 7 -26 7 10 -26
  [3,16,14.50385,0,-26,7,7,-26,7,10,-26],
// 4 16 14.50385 0 -26 16 16 -26 16 -16 -26 14.50385 -3.5 -26
  [4,16,14.50385,0,-26,16,16,-26,16,-16,-26,14.50385,-3.5,-26],
// 3 16 14.50385 -7 -26 14.50385 -3.5 -26 16 -16 -26
  [3,16,14.50385,-7,-26,14.50385,-3.5,-26,16,-16,-26],
// 3 4 -3.5 0 -26 -7 0 -26 -7 3.5 -26
  [3,4,-3.5,0,-26,-7,0,-26,-7,3.5,-26],
// 4 16 -7 0 -26 -3.5 0 -26 -4 -7.5 -26 -7.5 -7.5 -26
  [4,16,-7,0,-26,-3.5,0,-26,-4,-7.5,-26,-7.5,-7.5,-26],
// 4 16 -7 0 -26 -11 -3.5 -26 -11 0 -26 -7 3.5 -26
  [4,16,-7,0,-26,-11,-3.5,-26,-11,0,-26,-7,3.5,-26],
];
makepoly(ldraw_lib__19727p01(), line=0.2);
